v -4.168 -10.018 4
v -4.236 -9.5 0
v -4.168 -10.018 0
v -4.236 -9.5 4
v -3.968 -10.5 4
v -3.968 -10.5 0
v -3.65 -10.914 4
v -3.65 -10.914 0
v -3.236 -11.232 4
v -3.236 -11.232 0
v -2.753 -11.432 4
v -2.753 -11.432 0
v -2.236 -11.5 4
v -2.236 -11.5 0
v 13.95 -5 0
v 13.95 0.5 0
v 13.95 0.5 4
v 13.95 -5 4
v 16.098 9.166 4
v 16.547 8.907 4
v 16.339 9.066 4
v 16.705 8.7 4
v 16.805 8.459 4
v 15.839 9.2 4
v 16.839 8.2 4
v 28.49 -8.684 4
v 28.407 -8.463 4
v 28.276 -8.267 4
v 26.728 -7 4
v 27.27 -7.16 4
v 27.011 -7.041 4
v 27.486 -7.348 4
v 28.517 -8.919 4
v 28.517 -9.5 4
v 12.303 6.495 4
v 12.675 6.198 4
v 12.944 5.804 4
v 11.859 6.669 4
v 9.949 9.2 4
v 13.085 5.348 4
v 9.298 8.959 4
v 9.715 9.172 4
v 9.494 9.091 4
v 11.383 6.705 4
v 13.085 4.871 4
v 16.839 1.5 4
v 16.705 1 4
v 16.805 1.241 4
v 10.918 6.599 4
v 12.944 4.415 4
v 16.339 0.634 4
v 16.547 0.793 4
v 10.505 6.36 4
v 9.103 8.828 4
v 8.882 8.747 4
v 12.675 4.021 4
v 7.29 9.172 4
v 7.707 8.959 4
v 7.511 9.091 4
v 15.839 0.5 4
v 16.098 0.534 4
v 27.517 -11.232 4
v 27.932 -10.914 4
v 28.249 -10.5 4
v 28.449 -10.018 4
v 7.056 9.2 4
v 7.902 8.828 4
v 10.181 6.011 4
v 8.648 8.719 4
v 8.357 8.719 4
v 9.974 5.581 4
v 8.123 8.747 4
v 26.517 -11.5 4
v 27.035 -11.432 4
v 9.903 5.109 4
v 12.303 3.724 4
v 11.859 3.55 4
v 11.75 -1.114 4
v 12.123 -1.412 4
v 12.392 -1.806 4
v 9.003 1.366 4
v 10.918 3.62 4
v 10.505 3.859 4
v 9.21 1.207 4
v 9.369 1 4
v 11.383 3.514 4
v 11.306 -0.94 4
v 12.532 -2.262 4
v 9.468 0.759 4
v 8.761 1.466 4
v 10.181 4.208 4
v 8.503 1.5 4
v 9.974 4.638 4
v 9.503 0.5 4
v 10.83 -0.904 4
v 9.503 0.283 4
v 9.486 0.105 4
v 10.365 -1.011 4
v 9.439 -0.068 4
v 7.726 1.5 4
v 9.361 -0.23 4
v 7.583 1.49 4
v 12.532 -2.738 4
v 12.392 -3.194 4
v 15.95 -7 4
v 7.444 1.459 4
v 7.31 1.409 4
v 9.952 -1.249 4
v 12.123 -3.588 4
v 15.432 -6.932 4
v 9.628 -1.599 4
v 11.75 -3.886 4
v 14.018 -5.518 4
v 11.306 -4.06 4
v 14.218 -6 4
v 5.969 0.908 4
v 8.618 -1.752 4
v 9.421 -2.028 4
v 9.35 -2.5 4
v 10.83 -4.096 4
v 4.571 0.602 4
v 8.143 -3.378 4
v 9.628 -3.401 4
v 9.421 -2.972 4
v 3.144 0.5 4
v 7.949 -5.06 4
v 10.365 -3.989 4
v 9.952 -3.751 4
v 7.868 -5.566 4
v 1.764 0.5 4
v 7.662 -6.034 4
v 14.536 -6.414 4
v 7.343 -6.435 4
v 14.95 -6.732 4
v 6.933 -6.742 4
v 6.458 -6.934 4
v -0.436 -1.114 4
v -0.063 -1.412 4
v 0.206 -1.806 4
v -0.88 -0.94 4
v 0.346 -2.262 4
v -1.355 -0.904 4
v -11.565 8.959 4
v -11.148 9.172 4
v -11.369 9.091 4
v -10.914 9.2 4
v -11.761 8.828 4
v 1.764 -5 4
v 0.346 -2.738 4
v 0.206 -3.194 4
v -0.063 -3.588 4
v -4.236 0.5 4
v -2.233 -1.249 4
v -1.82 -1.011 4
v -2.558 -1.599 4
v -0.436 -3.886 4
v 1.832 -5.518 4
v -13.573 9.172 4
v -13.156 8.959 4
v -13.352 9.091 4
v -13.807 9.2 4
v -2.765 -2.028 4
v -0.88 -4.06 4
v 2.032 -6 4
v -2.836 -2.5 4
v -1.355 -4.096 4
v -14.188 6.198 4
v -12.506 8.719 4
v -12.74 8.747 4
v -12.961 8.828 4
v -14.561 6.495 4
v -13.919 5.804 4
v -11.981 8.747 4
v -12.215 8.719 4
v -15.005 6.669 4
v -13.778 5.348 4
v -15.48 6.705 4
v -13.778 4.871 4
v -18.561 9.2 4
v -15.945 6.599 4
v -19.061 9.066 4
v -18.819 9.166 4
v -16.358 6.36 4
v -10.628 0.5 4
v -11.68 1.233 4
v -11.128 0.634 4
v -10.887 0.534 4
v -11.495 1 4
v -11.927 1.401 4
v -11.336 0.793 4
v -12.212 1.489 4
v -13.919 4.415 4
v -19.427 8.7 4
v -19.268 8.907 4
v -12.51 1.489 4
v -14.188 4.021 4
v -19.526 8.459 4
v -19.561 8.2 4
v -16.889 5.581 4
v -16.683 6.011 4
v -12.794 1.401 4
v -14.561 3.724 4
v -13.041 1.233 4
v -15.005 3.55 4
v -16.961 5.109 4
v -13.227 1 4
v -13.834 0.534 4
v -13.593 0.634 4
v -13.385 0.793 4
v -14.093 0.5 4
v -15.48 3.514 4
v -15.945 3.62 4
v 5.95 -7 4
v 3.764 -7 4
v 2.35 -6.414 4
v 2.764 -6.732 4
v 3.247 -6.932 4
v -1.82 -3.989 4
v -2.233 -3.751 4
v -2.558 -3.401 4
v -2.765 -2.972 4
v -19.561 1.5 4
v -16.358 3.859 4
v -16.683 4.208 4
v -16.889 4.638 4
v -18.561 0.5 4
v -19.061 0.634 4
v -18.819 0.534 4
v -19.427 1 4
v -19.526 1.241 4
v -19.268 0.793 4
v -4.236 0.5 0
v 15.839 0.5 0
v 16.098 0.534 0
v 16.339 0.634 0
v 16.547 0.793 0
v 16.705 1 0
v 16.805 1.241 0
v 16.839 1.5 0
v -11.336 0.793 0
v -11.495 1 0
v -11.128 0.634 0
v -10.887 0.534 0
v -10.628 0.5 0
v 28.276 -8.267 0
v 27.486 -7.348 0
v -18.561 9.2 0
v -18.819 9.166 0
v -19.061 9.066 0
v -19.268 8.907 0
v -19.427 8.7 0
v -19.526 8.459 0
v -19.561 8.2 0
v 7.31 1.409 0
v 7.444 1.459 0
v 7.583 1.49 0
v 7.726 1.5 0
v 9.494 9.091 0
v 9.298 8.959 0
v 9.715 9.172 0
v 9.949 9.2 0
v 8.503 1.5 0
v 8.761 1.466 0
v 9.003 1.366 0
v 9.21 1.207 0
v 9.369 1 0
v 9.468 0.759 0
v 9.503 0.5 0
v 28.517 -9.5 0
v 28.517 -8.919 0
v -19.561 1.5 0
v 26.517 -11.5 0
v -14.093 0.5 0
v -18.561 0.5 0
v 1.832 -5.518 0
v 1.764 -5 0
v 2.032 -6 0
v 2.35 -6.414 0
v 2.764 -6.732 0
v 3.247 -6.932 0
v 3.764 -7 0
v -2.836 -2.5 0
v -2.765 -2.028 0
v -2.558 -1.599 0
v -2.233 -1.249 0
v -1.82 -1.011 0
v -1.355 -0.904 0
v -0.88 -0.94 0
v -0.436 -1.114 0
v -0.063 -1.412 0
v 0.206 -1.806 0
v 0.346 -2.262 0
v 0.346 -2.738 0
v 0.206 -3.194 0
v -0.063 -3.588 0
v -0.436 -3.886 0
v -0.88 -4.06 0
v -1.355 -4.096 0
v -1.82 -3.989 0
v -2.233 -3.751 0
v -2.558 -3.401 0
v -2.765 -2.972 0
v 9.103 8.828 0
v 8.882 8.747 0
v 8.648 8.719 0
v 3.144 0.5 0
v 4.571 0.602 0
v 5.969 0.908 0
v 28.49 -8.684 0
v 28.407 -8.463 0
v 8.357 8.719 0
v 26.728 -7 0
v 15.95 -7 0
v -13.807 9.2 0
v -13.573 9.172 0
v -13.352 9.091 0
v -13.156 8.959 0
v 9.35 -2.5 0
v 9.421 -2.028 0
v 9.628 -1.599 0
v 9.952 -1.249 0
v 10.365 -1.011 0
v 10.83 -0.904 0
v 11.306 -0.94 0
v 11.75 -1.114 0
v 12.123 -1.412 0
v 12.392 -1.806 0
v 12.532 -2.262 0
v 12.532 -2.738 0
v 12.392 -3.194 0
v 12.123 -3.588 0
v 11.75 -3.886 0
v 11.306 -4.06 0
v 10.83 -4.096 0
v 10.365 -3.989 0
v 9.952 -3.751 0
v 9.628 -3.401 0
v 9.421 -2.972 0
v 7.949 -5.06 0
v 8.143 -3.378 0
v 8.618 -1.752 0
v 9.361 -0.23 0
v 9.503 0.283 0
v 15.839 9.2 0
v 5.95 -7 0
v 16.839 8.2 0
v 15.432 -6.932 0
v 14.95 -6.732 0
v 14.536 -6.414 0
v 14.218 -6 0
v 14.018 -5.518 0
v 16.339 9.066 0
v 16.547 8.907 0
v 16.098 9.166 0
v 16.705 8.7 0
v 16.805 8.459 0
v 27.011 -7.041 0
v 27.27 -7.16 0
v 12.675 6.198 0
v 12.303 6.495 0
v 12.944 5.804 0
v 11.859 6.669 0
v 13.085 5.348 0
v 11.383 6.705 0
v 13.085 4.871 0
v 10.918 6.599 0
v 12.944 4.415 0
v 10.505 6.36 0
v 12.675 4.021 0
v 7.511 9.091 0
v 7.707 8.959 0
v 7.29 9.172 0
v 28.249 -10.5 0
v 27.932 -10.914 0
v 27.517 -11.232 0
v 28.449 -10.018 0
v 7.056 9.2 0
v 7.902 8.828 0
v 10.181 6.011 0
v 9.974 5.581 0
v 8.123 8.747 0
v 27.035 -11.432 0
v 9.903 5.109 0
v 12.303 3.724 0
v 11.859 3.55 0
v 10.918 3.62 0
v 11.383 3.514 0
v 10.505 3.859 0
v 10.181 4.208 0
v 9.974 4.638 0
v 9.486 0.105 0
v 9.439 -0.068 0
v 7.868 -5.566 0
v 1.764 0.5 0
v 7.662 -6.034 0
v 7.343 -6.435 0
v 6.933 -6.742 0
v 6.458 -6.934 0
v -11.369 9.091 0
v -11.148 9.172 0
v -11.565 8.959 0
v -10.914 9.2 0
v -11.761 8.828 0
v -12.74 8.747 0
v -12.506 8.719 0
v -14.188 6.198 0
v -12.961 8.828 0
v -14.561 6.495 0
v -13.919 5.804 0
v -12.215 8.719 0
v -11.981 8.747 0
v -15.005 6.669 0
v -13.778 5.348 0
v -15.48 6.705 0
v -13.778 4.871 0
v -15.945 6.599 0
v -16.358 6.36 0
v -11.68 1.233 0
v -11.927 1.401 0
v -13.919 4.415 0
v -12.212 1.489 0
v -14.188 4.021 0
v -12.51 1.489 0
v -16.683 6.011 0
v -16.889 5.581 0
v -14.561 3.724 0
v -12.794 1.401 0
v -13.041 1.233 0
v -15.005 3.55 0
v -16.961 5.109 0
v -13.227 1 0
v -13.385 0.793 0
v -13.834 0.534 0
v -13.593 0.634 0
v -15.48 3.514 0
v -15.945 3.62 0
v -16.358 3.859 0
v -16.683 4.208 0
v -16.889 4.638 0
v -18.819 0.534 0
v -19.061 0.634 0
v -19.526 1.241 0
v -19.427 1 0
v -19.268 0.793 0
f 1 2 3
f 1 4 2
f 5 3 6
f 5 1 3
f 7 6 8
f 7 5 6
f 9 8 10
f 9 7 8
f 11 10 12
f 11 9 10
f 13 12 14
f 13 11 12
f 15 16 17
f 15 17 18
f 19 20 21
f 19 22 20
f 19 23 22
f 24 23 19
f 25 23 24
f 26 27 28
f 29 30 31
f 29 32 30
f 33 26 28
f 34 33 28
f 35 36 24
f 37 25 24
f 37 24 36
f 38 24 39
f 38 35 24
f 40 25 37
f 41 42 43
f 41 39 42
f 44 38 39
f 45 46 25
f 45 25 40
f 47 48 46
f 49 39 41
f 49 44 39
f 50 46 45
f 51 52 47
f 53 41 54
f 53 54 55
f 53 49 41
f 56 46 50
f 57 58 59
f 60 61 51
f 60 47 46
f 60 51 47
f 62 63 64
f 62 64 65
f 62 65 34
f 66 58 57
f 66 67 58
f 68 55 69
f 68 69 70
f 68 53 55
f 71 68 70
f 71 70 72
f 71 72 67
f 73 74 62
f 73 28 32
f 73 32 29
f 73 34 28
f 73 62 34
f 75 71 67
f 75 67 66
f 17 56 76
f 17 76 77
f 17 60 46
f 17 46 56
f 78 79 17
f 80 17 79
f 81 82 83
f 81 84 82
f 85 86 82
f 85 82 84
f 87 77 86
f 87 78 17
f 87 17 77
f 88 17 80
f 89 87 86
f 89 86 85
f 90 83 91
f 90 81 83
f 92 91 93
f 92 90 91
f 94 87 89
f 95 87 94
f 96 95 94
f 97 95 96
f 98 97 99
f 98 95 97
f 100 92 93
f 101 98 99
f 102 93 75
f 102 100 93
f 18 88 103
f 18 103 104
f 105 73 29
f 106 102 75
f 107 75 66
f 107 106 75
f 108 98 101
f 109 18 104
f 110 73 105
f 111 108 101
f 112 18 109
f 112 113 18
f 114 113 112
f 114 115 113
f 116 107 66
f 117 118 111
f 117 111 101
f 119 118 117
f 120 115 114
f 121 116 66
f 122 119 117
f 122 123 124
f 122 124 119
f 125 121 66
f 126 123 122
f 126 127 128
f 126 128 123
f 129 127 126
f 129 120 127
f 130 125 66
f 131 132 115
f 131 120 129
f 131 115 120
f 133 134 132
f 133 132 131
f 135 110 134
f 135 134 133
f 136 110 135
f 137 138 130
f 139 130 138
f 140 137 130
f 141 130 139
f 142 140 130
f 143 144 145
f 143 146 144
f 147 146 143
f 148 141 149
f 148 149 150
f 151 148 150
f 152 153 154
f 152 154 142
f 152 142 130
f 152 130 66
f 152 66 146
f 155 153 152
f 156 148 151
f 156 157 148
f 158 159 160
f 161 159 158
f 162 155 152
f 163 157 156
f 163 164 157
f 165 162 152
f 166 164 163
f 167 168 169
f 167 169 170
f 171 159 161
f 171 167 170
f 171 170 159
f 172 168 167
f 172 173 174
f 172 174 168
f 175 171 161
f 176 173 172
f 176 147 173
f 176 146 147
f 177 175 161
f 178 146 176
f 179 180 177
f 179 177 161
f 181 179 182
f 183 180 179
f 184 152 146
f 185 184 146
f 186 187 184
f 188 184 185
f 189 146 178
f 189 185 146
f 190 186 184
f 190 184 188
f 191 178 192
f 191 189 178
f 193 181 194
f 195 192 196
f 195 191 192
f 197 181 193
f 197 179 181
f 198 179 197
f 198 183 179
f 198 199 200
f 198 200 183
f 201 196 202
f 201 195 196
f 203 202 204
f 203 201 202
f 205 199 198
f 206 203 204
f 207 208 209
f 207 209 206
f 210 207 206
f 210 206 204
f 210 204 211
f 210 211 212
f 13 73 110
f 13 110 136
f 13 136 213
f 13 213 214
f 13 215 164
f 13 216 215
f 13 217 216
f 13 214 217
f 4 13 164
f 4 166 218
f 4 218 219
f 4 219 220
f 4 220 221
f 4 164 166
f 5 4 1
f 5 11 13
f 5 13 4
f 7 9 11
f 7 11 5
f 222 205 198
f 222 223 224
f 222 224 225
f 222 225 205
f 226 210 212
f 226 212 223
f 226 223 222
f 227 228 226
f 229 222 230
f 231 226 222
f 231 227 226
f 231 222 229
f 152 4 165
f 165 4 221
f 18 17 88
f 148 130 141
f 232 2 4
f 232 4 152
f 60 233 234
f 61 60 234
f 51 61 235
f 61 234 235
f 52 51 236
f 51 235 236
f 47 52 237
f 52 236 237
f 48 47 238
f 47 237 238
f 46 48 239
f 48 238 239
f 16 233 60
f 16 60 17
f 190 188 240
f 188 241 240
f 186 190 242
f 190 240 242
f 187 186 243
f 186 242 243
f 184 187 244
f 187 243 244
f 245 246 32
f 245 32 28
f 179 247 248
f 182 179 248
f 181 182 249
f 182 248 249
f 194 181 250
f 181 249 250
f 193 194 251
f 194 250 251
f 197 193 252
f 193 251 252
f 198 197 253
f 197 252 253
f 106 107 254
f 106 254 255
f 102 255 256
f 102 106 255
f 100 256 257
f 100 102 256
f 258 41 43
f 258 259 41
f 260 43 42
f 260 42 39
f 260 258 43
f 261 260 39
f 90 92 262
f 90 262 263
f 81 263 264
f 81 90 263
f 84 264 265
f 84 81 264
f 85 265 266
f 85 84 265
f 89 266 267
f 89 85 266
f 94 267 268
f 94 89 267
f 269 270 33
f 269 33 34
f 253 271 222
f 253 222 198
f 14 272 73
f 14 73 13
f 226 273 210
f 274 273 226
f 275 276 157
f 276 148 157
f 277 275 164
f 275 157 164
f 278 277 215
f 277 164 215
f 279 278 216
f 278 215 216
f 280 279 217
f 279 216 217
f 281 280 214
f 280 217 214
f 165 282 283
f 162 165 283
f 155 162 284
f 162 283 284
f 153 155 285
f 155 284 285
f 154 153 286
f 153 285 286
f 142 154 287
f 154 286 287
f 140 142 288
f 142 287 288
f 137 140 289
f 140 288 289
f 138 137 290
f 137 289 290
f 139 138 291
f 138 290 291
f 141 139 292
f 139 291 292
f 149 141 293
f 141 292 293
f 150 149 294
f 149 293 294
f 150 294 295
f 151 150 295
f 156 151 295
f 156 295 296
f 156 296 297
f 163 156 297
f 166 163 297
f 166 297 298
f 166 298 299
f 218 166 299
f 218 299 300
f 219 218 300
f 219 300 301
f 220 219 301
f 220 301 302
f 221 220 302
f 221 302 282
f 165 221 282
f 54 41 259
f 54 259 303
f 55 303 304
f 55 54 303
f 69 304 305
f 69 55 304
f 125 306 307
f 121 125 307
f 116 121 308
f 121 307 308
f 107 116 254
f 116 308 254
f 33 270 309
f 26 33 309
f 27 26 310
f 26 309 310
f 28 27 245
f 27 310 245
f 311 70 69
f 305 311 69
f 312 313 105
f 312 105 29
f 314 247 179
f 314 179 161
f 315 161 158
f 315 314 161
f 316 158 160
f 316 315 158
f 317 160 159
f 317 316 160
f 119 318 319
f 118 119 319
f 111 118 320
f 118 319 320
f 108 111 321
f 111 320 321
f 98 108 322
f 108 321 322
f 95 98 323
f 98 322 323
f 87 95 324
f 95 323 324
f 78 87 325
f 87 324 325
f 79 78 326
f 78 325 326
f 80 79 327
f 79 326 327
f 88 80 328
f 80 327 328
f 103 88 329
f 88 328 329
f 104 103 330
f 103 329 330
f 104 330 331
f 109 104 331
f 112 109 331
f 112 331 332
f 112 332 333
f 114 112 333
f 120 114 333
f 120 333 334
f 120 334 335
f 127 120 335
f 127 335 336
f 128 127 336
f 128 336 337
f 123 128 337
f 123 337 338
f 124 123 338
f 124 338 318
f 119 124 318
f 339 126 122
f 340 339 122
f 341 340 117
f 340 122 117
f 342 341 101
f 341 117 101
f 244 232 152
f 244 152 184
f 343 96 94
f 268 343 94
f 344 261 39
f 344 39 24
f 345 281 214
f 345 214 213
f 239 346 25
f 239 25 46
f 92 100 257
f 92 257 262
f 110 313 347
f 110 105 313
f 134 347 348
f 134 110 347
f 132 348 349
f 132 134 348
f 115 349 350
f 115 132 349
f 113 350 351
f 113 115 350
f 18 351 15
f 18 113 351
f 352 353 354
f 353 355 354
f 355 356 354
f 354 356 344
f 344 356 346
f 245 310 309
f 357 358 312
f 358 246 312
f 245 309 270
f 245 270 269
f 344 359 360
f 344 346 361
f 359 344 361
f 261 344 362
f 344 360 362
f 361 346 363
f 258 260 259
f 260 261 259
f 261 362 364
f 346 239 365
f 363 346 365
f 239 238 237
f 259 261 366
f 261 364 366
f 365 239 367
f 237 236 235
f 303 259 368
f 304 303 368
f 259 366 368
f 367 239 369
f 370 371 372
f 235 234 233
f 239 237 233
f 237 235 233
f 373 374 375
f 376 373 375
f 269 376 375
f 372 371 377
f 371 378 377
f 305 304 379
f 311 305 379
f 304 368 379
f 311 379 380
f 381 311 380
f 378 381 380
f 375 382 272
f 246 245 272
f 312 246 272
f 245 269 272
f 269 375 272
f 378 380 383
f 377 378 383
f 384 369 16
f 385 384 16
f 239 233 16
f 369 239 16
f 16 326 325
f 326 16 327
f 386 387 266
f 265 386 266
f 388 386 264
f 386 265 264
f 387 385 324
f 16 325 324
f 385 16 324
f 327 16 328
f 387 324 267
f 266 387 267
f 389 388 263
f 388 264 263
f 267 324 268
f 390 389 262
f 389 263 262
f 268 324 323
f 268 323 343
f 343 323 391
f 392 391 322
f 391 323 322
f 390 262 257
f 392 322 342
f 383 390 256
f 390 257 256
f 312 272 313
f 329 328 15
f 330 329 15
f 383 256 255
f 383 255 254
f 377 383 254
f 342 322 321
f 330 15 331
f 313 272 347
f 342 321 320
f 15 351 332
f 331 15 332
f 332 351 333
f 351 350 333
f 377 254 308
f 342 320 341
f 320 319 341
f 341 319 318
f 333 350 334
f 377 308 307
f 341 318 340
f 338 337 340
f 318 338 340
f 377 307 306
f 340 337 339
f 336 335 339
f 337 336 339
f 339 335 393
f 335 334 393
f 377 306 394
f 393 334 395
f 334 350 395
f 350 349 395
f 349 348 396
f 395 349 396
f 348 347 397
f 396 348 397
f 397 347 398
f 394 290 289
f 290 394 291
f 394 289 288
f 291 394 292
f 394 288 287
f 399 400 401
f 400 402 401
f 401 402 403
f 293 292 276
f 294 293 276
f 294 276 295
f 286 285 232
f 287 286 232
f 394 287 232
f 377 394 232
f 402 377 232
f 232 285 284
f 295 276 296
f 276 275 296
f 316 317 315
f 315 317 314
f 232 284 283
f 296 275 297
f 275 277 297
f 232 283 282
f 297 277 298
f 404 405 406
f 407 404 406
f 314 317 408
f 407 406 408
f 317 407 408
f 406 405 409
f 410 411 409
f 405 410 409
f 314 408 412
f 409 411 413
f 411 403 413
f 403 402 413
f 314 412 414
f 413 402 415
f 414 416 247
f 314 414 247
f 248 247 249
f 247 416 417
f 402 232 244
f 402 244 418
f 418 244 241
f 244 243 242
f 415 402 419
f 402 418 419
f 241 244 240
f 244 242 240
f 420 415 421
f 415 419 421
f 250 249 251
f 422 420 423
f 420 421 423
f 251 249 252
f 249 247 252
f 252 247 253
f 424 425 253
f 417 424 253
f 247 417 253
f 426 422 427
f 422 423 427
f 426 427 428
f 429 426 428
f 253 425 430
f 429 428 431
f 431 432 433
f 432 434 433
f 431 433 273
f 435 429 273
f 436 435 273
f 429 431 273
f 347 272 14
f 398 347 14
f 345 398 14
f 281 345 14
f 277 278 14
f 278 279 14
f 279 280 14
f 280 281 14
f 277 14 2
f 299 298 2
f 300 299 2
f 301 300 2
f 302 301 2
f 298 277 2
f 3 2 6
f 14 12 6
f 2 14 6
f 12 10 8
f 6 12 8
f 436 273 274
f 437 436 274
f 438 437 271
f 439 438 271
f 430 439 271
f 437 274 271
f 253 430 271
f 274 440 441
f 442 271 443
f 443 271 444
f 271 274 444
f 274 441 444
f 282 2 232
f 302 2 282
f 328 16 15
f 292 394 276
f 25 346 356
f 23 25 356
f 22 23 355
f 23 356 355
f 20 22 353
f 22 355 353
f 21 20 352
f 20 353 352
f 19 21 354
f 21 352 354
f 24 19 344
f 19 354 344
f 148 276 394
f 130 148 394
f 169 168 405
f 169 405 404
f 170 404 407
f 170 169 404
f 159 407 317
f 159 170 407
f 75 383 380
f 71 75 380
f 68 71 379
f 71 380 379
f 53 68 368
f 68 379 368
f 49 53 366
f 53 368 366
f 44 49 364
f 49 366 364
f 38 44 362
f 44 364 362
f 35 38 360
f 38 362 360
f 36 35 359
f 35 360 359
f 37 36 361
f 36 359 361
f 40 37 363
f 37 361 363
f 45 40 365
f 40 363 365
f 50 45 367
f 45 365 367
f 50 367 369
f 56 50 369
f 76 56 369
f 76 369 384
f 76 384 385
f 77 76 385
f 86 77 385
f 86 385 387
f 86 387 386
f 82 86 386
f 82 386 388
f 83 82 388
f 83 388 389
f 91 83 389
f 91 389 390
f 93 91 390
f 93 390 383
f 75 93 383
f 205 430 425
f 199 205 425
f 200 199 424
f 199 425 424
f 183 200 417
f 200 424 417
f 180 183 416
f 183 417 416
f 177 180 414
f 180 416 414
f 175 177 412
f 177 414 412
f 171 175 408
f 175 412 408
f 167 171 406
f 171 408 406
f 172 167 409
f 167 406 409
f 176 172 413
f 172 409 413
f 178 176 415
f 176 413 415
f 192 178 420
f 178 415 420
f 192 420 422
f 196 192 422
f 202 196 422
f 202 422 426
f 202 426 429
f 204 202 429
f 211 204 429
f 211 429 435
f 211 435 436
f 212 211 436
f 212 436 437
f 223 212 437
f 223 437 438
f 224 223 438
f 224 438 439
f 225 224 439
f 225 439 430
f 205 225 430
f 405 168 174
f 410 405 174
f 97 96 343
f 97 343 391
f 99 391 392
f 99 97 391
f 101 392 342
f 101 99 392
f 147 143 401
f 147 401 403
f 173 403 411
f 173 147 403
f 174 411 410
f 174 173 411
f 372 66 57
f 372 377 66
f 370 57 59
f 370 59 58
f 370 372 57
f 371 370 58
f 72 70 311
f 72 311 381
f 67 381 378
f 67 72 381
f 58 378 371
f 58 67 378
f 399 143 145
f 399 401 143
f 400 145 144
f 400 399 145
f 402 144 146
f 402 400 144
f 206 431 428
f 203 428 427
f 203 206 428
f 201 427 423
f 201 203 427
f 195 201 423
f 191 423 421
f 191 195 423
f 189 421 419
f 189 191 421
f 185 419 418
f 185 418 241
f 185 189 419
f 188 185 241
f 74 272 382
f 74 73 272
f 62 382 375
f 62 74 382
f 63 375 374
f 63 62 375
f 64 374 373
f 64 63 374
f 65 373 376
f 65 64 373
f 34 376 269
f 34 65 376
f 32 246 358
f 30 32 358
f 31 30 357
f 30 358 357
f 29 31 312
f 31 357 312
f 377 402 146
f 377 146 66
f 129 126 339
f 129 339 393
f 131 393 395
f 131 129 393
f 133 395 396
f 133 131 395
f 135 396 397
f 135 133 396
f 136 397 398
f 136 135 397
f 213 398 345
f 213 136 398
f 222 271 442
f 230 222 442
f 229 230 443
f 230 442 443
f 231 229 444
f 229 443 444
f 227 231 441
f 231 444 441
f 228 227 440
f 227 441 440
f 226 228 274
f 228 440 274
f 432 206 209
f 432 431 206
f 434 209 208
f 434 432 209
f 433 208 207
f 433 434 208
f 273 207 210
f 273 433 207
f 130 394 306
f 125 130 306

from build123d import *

# Parameters (mm, degrees)
SKETCH1_W            = 6.185857864
SKETCH1_H            = 7.5
BOSS_EXTRUDE1_DEPTH  = 4
FILLET1_R            = 2
M3_CLEARANCE_HOLE1_D = 3.2
SKETCH4_W            = 2
SKETCH4_H            = 0.481048
SKETCH4_H_2          = 1
CUT_EXTRUDE1_DEPTH   = 10
FILLET2_R            = 10
FILLET3_R            = 1
FILLET4_R            = 1


with BuildPart() as part:
    # Sketch1 → Boss-Extrude1 (new body)
    with BuildSketch(Plane.XY):
        Polygon((-4.235857864, -11.50026715), (-4.235857864, 0.5), (-19.56054874, 0.5), (-19.56054874, 9.2), (16.83945126, 9.2), (16.83945126, 0.5), (13.95, 0.5), (13.95, -7), (27.186678327, -7), (28.517391444, -8.547881241), (28.517391444, -11.5), align=None)
        with Locations((4.857071068, -3.25)):
            Rectangle(SKETCH1_W, SKETCH1_H, mode=Mode.SUBTRACT)
    extrude(amount=BOSS_EXTRUDE1_DEPTH)

    # Fillet1
    fillet1_edges = [part.edges().sort_by_distance(p)[0] for p in [
        (1.764142136, -7, 2),
        (7.95, -7, 2),
        (-4.235857864, -11.50026715, 2),
        (13.95, -7, 2),
        (28.517391444, -11.5, 2),
    ]]
    fillet(fillet1_edges, radius=FILLET1_R)

    # M3 Clearance Hole1 (through all)
    with Locations(Plane.XY.offset(4)):
        with Locations((10.95, -2.5), (-1.235857864, -2.5), (11.502527164, 5.109476), (-15.36054874, 5.109476)):
            Hole(M3_CLEARANCE_HOLE1_D / 2)

    # Sketch4 → Cut-Extrude1 (cut)
    with BuildSketch(Plane.XY.offset(4)):
        with Locations((8.502527164, 8.959476)):
            Rectangle(SKETCH4_W, SKETCH4_H)
        with Locations((-12.36054874, 8.959476)):
            Rectangle(SKETCH4_W, SKETCH4_H)
        with Locations((-12.36054874, 1)):
            Rectangle(SKETCH4_W, SKETCH4_H_2)
        Polygon((7.502527164, 0.5), (7.502527164, 1.5), (9.502527164, 1.5), (9.502527164, 0.5), (9.502527164, 0), (7.502527164, 0), align=None)
    extrude(amount=-CUT_EXTRUDE1_DEPTH, mode=Mode.SUBTRACT)

    # Fillet2
    # the kernel refuses this fillet: 10 mm, written as the material it takes off along each edge
    with BuildSketch(Plane(origin=(7.502527164, 0.5, -10.897247359), x_dir=(-1, 0, 0), z_dir=(0, 0, 1))) as fillet2_piece_1:
        with BuildLine():
            CenterArc((4.358898944, -10), FILLET2_R, 90, 25.841932763)
            Line((0, -1), (0, 0))
            Line((0, 0), (4.358898944, 0))
        make_face()
    extrude(amount=25.794494718, mode=Mode.SUBTRACT)
    with BuildSketch(Plane(origin=(7.95, 0, 16.650074726), x_dir=(1.0, -2.8096218791575343e-12, 0), z_dir=(0, 0, -1))) as fillet2_piece_2:
        with BuildLine():
            CenterArc((9.994593415, 5.36017886), FILLET2_R, 181.719985699, 30.692982598)
            Line((-0.000901098, 5.06002981), (-1.000450549, 5.030014905))
            ThreePointArc((-1.000450549, 5.030014905), (-1, 5), (-1, 0))
            Line((-1, 0), (0, -1))
            ThreePointArc((0, -1), (0.776263582, -1), (0.708320539, -0.536017886))
            Line((0.708320539, -0.536017886), (1.552527164, 0))
        make_face()
    extrude(amount=29.300149451, mode=Mode.SUBTRACT)

    # Fillet3
    # the kernel refuses this fillet: 1 mm, written as the material it adds along each edge
    with BuildSketch(Plane(origin=(9.502527164, 0, 4), x_dir=(0, 1, 0), z_dir=(0, 0, -1))) as fillet3_piece_1:
        with BuildLine():
            CenterArc((0.283169872, -1), FILLET3_R, 90, 30.865981789)
            ThreePointArc((-0.229861831, -0.141630341), (-0.114452906, -0.071590966), (0, 0))
            Line((0, 0), (0.283169872, 0))
        make_face()
    extrude(amount=4)
    with BuildSketch(Plane(origin=(9.502527164, 1.5, 4), x_dir=(-1, 0, 0), z_dir=(0, 0, -1))) as fillet3_piece_2:
        with BuildLine():
            CenterArc((FILLET3_R, -FILLET3_R), FILLET3_R, 90, 90)
            Line((0, -FILLET3_R), (0, 0))
            Line((0, 0), (FILLET3_R, 0))
        make_face()
    extrude(amount=4)
    with BuildSketch(Plane(origin=(7.502527164, 1.5, 4), x_dir=(-0.9045968857212806, -0.42626807802527333, 0), z_dir=(0, 0, -1))) as fillet3_piece_3:
        with BuildLine():
            CenterArc((0.223930785, -0.999943145), FILLET3_R, 90.610977717, 24.619977329)
            Line((-0.202337293, -0.095346259), (0, 0))
            ThreePointArc((0, 0), (0.106633707, -0.000568554), (0.213267415, 0))
        make_face()
    extrude(amount=4)
    with BuildSketch(Plane(origin=(-13.36054874, 8.718952, 4), x_dir=(0, 1, 0), z_dir=(0, 0, -1))) as fillet3_piece_4:
        with BuildLine():
            CenterArc((1, 0.854803382), FILLET3_R, 180, 58.738020049)
            Line((0, 0.854803382), (0, 0))
            Line((0, 0), (0.481048, 0))
        make_face()
    extrude(amount=4)
    with BuildSketch(Plane(origin=(-11.36054874, 8.718952, 4), x_dir=(-1, 0, 0), z_dir=(0, 0, -1))) as fillet3_piece_5:
        with BuildLine():
            CenterArc((0.854803382, 1), FILLET3_R, 211.261979951, 58.738020049)
            Line((0, 0.481048), (0, 0))
            Line((0, 0), (0.854803382, 0))
        make_face()
    extrude(amount=4)
    with BuildSketch(Plane(origin=(9.502527164, 8.718952, 4), x_dir=(0, 1, 0), z_dir=(0, 0, -1))) as fillet3_piece_6:
        with BuildLine():
            CenterArc((1, -0.854803382), FILLET3_R, 121.261979951, 58.738020049)
            Line((0, -0.854803382), (0, 0))
            Line((0, 0), (0.481048, 0))
        make_face()
    extrude(amount=4)
    with BuildSketch(Plane(origin=(7.502527164, 8.718952, 4), x_dir=(1, 0, 0), z_dir=(0, 0, -1))) as fillet3_piece_7:
        with BuildLine():
            CenterArc((0.854803382, -1), FILLET3_R, 90, 58.738020049)
            Line((0, -0.481048), (0, 0))
            Line((0, 0), (0.854803382, 0))
        make_face()
    extrude(amount=4)
    with BuildSketch(Plane(origin=(-13.36054874, 1.5, 4), x_dir=(1, 0, 0), z_dir=(0, 0, -1)), Plane(origin=(-11.36054874, 1.5, 4), x_dir=(0, -1, 0), z_dir=(0, 0, -1))) as fillet3_piece_8:
        with BuildLine():
            CenterArc((FILLET3_R, FILLET3_R), FILLET3_R, 180, 90)
            Line((0, FILLET3_R), (0, 0))
            Line((0, 0), (FILLET3_R, 0))
        make_face()
    extrude(amount=4)
    # the kernel refuses this fillet: 1 mm, written as the material it takes off along each edge
    with BuildSketch(Plane(origin=(28.517391444, -8.547881241, -0.926902713), x_dir=(0, -1, 0), z_dir=(0, 0, 1))) as fillet3_2_piece_1:
        with BuildLine():
            CenterArc((FILLET3_R * 0.370761085346, -FILLET3_R), FILLET3_R, 90, 40.685640486)
            Line((-FILLET3_R * 0.28114729377, -FILLET3_R * 0.241702258187), (0, 0))
            Line((0, 0), (FILLET3_R * 0.370761085346, 0))
        make_face()
    extrude(amount=5.853805427, mode=Mode.SUBTRACT)
    with BuildSketch(Plane(origin=(27.186678327, -7, -1.147608656), x_dir=(0.6519083791154829, -0.7582977418132165, 0), z_dir=(0, 0, 1))) as fillet3_2_piece_2:
        with BuildLine():
            CenterArc((FILLET3_R * 0.459043462337, -FILLET3_R), FILLET3_R, 90, 49.314359514)
            Line((-FILLET3_R * 0.299254279476, -FILLET3_R * 0.348091620885), (0, 0))
            Line((0, 0), (FILLET3_R * 0.459043462337, 0))
        make_face()
    extrude(amount=6.295217312, mode=Mode.SUBTRACT)
    with BuildSketch(Plane(origin=(-19.56054874, 0.5, -2.5), x_dir=(0, 1, 0), z_dir=(0, 0, 1)), Plane(origin=(-19.56054874, 9.2, -2.5), x_dir=(1, 0, 0), z_dir=(0, 0, 1)), Plane(origin=(16.83945126, 9.2, -2.5), x_dir=(0, -1, 0), z_dir=(0, 0, 1)), Plane(origin=(16.83945126, 0.5, -2.5), x_dir=(-1, 0, 0), z_dir=(0, 0, 1))) as fillet3_2_piece_3:
        with BuildLine():
            CenterArc((FILLET3_R, -FILLET3_R), FILLET3_R, 90, 90)
            Line((0, -FILLET3_R), (0, 0))
            Line((0, 0), (FILLET3_R, 0))
        make_face()
    extrude(amount=9, mode=Mode.SUBTRACT)

    # Fillet4
    fillet4_edges = [part.edges().sort_by_distance(p)[0] for p in [
        (9.502527164, 9.2, 2),
        (7.502527164, 9.2, 2),
        (-11.36054874, 9.2, 2),
        (-13.36054874, 9.2, 2),
        (-13.36054874, 0.5, 2),
        (-11.36054874, 0.5, 2),
    ]]
    fillet(fillet4_edges, radius=FILLET4_R)


solid = part.part
